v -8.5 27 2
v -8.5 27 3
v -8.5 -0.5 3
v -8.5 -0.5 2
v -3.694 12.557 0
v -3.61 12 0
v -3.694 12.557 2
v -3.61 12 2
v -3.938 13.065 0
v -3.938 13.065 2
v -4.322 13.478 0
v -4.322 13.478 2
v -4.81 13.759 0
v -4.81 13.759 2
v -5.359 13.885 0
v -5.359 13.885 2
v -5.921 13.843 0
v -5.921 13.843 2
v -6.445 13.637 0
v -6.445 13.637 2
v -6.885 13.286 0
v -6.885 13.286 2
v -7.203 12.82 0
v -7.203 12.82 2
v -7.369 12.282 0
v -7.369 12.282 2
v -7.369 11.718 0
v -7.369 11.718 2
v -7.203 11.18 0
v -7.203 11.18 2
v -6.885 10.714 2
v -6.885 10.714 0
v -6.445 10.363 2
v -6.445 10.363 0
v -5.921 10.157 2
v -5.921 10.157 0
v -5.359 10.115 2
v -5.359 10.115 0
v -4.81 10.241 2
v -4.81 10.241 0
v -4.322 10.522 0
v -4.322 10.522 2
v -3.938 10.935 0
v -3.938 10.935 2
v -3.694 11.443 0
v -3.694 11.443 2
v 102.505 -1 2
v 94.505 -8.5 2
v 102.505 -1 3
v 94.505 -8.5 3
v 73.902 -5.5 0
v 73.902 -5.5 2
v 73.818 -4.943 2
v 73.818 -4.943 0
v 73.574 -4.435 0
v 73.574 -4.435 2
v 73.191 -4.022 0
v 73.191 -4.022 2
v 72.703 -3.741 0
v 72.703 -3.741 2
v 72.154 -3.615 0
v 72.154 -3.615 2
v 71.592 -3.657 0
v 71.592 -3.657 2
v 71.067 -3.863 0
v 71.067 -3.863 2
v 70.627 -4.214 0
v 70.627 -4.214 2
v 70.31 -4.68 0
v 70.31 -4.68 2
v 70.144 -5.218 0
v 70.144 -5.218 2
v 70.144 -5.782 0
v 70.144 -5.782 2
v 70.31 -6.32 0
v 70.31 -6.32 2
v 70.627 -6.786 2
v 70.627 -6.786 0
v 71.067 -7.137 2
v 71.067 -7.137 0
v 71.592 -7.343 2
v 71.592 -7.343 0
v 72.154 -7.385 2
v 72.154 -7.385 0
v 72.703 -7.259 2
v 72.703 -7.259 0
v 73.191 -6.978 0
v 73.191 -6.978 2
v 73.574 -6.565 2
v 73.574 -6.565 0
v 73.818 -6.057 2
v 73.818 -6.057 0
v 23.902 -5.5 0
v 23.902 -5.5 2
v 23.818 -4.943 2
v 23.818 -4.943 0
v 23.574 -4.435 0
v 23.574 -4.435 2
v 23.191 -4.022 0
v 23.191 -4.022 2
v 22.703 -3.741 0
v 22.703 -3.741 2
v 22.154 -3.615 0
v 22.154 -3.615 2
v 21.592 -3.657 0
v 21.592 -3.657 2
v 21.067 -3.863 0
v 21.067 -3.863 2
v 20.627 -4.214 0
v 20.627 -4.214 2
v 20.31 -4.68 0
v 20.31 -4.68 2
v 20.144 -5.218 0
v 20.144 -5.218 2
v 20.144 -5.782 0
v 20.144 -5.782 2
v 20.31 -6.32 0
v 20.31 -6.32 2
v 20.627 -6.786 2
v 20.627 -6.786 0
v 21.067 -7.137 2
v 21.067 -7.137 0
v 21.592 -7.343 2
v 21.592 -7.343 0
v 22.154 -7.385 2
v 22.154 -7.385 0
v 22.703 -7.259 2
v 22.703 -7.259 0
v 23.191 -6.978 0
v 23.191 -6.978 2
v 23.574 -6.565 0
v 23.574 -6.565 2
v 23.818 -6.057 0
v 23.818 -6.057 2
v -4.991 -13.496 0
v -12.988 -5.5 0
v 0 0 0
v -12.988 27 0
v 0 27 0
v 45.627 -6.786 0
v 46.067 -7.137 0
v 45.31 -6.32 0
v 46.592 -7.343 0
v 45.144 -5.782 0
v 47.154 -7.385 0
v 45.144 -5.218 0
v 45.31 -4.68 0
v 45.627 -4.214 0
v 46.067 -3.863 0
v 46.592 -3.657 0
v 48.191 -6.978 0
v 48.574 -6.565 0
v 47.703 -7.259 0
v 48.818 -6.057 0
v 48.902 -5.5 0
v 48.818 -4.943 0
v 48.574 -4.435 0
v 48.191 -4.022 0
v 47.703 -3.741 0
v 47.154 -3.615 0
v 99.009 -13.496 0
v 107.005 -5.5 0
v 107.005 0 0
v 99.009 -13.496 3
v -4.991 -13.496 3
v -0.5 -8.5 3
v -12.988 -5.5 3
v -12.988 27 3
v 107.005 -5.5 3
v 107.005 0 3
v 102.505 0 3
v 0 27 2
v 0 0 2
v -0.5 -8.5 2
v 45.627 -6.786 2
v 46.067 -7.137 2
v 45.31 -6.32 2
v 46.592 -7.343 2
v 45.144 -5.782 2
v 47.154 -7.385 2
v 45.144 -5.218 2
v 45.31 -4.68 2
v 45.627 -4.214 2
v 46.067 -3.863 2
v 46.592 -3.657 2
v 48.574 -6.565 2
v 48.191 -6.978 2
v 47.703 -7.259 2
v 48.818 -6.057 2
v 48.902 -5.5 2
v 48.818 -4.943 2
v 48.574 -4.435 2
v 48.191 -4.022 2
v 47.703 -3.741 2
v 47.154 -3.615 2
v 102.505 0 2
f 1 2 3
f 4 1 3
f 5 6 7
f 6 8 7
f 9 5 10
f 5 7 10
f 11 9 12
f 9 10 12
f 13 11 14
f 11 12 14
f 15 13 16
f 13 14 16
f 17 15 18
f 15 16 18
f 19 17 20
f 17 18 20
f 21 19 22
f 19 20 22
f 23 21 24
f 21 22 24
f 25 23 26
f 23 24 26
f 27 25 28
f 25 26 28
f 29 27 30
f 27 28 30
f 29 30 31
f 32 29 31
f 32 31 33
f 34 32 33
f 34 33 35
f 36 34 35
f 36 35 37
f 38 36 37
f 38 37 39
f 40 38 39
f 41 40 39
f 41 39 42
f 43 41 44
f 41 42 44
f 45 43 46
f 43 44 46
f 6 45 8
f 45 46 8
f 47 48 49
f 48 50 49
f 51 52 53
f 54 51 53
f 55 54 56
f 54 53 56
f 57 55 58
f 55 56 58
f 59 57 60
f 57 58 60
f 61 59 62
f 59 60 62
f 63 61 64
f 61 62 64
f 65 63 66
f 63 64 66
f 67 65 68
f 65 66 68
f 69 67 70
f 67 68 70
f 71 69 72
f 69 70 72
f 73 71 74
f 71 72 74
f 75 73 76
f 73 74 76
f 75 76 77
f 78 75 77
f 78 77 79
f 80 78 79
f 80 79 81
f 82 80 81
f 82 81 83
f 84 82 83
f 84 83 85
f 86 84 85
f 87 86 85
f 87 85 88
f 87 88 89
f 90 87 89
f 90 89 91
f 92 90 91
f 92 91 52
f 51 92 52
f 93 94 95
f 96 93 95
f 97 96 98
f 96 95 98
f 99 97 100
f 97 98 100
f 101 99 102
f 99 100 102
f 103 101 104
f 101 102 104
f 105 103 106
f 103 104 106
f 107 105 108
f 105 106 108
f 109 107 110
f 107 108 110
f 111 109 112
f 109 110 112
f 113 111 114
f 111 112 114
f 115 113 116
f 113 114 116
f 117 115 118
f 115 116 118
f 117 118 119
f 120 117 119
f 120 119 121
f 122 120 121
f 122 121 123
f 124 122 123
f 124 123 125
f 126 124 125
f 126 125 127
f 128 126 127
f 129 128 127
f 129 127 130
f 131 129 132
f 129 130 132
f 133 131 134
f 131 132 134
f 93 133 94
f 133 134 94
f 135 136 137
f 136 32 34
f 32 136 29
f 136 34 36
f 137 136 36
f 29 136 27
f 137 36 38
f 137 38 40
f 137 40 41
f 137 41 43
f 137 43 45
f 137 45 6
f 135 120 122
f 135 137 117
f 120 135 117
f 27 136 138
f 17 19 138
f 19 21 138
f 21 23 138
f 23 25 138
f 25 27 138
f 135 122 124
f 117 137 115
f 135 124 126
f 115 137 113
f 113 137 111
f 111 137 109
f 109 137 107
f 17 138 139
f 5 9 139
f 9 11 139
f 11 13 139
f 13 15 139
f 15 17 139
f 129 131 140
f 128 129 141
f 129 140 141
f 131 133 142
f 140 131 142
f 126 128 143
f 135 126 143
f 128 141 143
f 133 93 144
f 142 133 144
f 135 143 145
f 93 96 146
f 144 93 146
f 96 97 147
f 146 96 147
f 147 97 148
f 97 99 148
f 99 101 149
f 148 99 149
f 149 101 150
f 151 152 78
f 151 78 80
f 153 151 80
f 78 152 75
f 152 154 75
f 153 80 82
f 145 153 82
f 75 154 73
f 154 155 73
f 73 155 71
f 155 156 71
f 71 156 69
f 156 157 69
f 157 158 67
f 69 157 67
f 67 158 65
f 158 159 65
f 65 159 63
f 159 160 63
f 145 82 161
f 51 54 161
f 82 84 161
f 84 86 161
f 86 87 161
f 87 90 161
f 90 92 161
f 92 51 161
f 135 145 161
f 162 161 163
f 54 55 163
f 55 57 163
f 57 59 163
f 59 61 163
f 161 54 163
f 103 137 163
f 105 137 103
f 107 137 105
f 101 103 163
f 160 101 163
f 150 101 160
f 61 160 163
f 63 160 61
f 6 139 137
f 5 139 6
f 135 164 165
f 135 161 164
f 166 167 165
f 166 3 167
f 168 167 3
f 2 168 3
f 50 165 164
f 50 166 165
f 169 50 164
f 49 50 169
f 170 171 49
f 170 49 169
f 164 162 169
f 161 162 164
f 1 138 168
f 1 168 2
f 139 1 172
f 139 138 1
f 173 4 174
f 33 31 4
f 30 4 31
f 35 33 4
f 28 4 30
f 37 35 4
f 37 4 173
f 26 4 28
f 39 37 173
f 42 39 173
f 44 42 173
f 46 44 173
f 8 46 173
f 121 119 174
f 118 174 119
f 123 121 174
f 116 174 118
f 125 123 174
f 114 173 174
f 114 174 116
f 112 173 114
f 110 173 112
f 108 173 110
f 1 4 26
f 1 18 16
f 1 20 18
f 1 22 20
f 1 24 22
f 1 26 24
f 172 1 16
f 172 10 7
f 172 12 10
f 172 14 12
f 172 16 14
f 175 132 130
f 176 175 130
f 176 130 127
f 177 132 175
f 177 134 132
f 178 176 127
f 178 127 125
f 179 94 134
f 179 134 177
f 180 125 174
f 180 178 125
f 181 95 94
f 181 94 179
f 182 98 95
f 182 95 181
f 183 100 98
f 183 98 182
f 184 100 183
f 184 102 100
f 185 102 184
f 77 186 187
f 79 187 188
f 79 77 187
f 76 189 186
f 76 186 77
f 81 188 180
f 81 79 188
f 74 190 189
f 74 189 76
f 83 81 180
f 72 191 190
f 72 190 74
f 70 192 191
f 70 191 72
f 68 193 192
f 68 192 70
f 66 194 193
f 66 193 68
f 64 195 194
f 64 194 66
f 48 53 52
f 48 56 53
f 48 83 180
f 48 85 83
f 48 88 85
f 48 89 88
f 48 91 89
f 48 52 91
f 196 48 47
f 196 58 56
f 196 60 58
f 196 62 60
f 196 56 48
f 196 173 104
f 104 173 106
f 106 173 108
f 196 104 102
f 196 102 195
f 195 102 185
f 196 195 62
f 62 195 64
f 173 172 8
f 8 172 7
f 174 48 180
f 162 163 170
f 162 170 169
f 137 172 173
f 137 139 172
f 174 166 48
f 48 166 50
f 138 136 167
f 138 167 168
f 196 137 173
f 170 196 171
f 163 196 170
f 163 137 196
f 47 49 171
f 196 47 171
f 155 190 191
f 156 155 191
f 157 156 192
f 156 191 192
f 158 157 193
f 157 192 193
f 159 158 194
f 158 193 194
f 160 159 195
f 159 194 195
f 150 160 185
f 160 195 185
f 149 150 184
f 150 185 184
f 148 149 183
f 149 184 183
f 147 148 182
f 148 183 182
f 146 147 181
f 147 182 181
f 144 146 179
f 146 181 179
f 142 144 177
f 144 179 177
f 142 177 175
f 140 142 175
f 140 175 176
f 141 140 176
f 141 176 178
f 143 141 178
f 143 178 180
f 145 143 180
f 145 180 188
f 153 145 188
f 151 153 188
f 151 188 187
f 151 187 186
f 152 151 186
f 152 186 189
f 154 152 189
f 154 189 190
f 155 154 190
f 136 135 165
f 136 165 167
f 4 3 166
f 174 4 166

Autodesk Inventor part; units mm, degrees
sketch "Boceto1" plane through (0, 0, 0) normal (0, 0, 1) x (1, 0, 0)
  line L0 (0, 0) -> (107.005, 0)
  line L1 (107.005, 0) -> (107.005, -5.5)
  line L2 (107.005, -5.5) -> (99.0087, -13.4963)
  line L3 (99.0087, -13.4963) -> (-4.9913, -13.4963)
  line L4 (-4.9913, -13.4963) -> (-12.9876, -5.5)
  line L5 (-12.9876, -5.5) -> (-12.9876, 27)
  line L6 (-12.9876, 27) -> (0, 27)
  line L7 (0, 27) -> (0, 0)
  line L8 (107.0124, -0.0005) -> (107.0124, -5.5005) projected
  line L9 (107.0124, -5.5005) -> (82.0124, -30.5) projected
  dimension "d0" = 107.005
  dimension "d1" = 5.5
  dimension "d5" = 32.5
  dimension "d8" = 27
  dimension "d34" = 135
extrude "Extrusión1" add sketch "Boceto1" along normal blind 3
sketch "Boceto2" plane through (0, 0, 3) normal (0, 0, 1) x (1, 0, 0)
  circle A0 centre (-5.5, 12) radius 1.89
  line L0 (0, 27) -> (-12.9876, 27) projected
  point P0 (0, 0)
  dimension "d11" = 3.78
  dimension "d12" = 15
  dimension "d13" = 5.5
extrude "Extrusión2" cut sketch "Boceto2" against normal through all
sketch "Boceto3" plane through (0, 0, 3) normal (0, 0, 1) x (1, 0, 0)
  circle A0 centre (22.0124, -5.5) radius 1.89
  line L0 (-12.9876, 27) -> (-12.9876, -5.5) projected
  point P0 (0, 0)
  dimension "d16" = 3.78
  dimension "d17" = 5.5
  dimension "d18" = 35
extrude "Extrusión3" cut sketch "Boceto3" against normal through all
pattern_linear "Patrón rectangular1" count 3 spacing 25 along (1, 0, 0) of "Extrusión3"
sketch "Boceto4" plane through (0, 0, 3) normal (0, 0, 1) x (1, 0, 0)
  line L0 (0, 0) -> (0, 27) projected
  line L1 (107.005, 0) -> (0, 0) projected
  line L2 (0, 27) -> (-8.5, 27)
  line L3 (0, 27) -> (-12.9876, 27) projected
  line L4 (-8.5, 27) -> (-8.5, -0.4998)
  line L5 (-0.4998, -8.5) -> (94.505, -8.5)
  line L6 (94.505, -8.5) -> (102.505, -1)
  line L7 (102.505, -1) -> (102.505, 0)
  line L8 (-8.5, -0.4998) -> (-0.4998, -8.5)
  line L9 (107.005, -5.5) -> (107.005, 0) projected
  dimension "d24" = 8.5
  dimension "d25" = 8.5
  dimension "d26" = 135
  dimension "d27" = 11.314
  dimension "d28" = 1
  dimension "d30" = 12.5
  dimension "d31" = 4.5
extrude "Extrusión4" cut sketch "Boceto4" against normal blind 1
